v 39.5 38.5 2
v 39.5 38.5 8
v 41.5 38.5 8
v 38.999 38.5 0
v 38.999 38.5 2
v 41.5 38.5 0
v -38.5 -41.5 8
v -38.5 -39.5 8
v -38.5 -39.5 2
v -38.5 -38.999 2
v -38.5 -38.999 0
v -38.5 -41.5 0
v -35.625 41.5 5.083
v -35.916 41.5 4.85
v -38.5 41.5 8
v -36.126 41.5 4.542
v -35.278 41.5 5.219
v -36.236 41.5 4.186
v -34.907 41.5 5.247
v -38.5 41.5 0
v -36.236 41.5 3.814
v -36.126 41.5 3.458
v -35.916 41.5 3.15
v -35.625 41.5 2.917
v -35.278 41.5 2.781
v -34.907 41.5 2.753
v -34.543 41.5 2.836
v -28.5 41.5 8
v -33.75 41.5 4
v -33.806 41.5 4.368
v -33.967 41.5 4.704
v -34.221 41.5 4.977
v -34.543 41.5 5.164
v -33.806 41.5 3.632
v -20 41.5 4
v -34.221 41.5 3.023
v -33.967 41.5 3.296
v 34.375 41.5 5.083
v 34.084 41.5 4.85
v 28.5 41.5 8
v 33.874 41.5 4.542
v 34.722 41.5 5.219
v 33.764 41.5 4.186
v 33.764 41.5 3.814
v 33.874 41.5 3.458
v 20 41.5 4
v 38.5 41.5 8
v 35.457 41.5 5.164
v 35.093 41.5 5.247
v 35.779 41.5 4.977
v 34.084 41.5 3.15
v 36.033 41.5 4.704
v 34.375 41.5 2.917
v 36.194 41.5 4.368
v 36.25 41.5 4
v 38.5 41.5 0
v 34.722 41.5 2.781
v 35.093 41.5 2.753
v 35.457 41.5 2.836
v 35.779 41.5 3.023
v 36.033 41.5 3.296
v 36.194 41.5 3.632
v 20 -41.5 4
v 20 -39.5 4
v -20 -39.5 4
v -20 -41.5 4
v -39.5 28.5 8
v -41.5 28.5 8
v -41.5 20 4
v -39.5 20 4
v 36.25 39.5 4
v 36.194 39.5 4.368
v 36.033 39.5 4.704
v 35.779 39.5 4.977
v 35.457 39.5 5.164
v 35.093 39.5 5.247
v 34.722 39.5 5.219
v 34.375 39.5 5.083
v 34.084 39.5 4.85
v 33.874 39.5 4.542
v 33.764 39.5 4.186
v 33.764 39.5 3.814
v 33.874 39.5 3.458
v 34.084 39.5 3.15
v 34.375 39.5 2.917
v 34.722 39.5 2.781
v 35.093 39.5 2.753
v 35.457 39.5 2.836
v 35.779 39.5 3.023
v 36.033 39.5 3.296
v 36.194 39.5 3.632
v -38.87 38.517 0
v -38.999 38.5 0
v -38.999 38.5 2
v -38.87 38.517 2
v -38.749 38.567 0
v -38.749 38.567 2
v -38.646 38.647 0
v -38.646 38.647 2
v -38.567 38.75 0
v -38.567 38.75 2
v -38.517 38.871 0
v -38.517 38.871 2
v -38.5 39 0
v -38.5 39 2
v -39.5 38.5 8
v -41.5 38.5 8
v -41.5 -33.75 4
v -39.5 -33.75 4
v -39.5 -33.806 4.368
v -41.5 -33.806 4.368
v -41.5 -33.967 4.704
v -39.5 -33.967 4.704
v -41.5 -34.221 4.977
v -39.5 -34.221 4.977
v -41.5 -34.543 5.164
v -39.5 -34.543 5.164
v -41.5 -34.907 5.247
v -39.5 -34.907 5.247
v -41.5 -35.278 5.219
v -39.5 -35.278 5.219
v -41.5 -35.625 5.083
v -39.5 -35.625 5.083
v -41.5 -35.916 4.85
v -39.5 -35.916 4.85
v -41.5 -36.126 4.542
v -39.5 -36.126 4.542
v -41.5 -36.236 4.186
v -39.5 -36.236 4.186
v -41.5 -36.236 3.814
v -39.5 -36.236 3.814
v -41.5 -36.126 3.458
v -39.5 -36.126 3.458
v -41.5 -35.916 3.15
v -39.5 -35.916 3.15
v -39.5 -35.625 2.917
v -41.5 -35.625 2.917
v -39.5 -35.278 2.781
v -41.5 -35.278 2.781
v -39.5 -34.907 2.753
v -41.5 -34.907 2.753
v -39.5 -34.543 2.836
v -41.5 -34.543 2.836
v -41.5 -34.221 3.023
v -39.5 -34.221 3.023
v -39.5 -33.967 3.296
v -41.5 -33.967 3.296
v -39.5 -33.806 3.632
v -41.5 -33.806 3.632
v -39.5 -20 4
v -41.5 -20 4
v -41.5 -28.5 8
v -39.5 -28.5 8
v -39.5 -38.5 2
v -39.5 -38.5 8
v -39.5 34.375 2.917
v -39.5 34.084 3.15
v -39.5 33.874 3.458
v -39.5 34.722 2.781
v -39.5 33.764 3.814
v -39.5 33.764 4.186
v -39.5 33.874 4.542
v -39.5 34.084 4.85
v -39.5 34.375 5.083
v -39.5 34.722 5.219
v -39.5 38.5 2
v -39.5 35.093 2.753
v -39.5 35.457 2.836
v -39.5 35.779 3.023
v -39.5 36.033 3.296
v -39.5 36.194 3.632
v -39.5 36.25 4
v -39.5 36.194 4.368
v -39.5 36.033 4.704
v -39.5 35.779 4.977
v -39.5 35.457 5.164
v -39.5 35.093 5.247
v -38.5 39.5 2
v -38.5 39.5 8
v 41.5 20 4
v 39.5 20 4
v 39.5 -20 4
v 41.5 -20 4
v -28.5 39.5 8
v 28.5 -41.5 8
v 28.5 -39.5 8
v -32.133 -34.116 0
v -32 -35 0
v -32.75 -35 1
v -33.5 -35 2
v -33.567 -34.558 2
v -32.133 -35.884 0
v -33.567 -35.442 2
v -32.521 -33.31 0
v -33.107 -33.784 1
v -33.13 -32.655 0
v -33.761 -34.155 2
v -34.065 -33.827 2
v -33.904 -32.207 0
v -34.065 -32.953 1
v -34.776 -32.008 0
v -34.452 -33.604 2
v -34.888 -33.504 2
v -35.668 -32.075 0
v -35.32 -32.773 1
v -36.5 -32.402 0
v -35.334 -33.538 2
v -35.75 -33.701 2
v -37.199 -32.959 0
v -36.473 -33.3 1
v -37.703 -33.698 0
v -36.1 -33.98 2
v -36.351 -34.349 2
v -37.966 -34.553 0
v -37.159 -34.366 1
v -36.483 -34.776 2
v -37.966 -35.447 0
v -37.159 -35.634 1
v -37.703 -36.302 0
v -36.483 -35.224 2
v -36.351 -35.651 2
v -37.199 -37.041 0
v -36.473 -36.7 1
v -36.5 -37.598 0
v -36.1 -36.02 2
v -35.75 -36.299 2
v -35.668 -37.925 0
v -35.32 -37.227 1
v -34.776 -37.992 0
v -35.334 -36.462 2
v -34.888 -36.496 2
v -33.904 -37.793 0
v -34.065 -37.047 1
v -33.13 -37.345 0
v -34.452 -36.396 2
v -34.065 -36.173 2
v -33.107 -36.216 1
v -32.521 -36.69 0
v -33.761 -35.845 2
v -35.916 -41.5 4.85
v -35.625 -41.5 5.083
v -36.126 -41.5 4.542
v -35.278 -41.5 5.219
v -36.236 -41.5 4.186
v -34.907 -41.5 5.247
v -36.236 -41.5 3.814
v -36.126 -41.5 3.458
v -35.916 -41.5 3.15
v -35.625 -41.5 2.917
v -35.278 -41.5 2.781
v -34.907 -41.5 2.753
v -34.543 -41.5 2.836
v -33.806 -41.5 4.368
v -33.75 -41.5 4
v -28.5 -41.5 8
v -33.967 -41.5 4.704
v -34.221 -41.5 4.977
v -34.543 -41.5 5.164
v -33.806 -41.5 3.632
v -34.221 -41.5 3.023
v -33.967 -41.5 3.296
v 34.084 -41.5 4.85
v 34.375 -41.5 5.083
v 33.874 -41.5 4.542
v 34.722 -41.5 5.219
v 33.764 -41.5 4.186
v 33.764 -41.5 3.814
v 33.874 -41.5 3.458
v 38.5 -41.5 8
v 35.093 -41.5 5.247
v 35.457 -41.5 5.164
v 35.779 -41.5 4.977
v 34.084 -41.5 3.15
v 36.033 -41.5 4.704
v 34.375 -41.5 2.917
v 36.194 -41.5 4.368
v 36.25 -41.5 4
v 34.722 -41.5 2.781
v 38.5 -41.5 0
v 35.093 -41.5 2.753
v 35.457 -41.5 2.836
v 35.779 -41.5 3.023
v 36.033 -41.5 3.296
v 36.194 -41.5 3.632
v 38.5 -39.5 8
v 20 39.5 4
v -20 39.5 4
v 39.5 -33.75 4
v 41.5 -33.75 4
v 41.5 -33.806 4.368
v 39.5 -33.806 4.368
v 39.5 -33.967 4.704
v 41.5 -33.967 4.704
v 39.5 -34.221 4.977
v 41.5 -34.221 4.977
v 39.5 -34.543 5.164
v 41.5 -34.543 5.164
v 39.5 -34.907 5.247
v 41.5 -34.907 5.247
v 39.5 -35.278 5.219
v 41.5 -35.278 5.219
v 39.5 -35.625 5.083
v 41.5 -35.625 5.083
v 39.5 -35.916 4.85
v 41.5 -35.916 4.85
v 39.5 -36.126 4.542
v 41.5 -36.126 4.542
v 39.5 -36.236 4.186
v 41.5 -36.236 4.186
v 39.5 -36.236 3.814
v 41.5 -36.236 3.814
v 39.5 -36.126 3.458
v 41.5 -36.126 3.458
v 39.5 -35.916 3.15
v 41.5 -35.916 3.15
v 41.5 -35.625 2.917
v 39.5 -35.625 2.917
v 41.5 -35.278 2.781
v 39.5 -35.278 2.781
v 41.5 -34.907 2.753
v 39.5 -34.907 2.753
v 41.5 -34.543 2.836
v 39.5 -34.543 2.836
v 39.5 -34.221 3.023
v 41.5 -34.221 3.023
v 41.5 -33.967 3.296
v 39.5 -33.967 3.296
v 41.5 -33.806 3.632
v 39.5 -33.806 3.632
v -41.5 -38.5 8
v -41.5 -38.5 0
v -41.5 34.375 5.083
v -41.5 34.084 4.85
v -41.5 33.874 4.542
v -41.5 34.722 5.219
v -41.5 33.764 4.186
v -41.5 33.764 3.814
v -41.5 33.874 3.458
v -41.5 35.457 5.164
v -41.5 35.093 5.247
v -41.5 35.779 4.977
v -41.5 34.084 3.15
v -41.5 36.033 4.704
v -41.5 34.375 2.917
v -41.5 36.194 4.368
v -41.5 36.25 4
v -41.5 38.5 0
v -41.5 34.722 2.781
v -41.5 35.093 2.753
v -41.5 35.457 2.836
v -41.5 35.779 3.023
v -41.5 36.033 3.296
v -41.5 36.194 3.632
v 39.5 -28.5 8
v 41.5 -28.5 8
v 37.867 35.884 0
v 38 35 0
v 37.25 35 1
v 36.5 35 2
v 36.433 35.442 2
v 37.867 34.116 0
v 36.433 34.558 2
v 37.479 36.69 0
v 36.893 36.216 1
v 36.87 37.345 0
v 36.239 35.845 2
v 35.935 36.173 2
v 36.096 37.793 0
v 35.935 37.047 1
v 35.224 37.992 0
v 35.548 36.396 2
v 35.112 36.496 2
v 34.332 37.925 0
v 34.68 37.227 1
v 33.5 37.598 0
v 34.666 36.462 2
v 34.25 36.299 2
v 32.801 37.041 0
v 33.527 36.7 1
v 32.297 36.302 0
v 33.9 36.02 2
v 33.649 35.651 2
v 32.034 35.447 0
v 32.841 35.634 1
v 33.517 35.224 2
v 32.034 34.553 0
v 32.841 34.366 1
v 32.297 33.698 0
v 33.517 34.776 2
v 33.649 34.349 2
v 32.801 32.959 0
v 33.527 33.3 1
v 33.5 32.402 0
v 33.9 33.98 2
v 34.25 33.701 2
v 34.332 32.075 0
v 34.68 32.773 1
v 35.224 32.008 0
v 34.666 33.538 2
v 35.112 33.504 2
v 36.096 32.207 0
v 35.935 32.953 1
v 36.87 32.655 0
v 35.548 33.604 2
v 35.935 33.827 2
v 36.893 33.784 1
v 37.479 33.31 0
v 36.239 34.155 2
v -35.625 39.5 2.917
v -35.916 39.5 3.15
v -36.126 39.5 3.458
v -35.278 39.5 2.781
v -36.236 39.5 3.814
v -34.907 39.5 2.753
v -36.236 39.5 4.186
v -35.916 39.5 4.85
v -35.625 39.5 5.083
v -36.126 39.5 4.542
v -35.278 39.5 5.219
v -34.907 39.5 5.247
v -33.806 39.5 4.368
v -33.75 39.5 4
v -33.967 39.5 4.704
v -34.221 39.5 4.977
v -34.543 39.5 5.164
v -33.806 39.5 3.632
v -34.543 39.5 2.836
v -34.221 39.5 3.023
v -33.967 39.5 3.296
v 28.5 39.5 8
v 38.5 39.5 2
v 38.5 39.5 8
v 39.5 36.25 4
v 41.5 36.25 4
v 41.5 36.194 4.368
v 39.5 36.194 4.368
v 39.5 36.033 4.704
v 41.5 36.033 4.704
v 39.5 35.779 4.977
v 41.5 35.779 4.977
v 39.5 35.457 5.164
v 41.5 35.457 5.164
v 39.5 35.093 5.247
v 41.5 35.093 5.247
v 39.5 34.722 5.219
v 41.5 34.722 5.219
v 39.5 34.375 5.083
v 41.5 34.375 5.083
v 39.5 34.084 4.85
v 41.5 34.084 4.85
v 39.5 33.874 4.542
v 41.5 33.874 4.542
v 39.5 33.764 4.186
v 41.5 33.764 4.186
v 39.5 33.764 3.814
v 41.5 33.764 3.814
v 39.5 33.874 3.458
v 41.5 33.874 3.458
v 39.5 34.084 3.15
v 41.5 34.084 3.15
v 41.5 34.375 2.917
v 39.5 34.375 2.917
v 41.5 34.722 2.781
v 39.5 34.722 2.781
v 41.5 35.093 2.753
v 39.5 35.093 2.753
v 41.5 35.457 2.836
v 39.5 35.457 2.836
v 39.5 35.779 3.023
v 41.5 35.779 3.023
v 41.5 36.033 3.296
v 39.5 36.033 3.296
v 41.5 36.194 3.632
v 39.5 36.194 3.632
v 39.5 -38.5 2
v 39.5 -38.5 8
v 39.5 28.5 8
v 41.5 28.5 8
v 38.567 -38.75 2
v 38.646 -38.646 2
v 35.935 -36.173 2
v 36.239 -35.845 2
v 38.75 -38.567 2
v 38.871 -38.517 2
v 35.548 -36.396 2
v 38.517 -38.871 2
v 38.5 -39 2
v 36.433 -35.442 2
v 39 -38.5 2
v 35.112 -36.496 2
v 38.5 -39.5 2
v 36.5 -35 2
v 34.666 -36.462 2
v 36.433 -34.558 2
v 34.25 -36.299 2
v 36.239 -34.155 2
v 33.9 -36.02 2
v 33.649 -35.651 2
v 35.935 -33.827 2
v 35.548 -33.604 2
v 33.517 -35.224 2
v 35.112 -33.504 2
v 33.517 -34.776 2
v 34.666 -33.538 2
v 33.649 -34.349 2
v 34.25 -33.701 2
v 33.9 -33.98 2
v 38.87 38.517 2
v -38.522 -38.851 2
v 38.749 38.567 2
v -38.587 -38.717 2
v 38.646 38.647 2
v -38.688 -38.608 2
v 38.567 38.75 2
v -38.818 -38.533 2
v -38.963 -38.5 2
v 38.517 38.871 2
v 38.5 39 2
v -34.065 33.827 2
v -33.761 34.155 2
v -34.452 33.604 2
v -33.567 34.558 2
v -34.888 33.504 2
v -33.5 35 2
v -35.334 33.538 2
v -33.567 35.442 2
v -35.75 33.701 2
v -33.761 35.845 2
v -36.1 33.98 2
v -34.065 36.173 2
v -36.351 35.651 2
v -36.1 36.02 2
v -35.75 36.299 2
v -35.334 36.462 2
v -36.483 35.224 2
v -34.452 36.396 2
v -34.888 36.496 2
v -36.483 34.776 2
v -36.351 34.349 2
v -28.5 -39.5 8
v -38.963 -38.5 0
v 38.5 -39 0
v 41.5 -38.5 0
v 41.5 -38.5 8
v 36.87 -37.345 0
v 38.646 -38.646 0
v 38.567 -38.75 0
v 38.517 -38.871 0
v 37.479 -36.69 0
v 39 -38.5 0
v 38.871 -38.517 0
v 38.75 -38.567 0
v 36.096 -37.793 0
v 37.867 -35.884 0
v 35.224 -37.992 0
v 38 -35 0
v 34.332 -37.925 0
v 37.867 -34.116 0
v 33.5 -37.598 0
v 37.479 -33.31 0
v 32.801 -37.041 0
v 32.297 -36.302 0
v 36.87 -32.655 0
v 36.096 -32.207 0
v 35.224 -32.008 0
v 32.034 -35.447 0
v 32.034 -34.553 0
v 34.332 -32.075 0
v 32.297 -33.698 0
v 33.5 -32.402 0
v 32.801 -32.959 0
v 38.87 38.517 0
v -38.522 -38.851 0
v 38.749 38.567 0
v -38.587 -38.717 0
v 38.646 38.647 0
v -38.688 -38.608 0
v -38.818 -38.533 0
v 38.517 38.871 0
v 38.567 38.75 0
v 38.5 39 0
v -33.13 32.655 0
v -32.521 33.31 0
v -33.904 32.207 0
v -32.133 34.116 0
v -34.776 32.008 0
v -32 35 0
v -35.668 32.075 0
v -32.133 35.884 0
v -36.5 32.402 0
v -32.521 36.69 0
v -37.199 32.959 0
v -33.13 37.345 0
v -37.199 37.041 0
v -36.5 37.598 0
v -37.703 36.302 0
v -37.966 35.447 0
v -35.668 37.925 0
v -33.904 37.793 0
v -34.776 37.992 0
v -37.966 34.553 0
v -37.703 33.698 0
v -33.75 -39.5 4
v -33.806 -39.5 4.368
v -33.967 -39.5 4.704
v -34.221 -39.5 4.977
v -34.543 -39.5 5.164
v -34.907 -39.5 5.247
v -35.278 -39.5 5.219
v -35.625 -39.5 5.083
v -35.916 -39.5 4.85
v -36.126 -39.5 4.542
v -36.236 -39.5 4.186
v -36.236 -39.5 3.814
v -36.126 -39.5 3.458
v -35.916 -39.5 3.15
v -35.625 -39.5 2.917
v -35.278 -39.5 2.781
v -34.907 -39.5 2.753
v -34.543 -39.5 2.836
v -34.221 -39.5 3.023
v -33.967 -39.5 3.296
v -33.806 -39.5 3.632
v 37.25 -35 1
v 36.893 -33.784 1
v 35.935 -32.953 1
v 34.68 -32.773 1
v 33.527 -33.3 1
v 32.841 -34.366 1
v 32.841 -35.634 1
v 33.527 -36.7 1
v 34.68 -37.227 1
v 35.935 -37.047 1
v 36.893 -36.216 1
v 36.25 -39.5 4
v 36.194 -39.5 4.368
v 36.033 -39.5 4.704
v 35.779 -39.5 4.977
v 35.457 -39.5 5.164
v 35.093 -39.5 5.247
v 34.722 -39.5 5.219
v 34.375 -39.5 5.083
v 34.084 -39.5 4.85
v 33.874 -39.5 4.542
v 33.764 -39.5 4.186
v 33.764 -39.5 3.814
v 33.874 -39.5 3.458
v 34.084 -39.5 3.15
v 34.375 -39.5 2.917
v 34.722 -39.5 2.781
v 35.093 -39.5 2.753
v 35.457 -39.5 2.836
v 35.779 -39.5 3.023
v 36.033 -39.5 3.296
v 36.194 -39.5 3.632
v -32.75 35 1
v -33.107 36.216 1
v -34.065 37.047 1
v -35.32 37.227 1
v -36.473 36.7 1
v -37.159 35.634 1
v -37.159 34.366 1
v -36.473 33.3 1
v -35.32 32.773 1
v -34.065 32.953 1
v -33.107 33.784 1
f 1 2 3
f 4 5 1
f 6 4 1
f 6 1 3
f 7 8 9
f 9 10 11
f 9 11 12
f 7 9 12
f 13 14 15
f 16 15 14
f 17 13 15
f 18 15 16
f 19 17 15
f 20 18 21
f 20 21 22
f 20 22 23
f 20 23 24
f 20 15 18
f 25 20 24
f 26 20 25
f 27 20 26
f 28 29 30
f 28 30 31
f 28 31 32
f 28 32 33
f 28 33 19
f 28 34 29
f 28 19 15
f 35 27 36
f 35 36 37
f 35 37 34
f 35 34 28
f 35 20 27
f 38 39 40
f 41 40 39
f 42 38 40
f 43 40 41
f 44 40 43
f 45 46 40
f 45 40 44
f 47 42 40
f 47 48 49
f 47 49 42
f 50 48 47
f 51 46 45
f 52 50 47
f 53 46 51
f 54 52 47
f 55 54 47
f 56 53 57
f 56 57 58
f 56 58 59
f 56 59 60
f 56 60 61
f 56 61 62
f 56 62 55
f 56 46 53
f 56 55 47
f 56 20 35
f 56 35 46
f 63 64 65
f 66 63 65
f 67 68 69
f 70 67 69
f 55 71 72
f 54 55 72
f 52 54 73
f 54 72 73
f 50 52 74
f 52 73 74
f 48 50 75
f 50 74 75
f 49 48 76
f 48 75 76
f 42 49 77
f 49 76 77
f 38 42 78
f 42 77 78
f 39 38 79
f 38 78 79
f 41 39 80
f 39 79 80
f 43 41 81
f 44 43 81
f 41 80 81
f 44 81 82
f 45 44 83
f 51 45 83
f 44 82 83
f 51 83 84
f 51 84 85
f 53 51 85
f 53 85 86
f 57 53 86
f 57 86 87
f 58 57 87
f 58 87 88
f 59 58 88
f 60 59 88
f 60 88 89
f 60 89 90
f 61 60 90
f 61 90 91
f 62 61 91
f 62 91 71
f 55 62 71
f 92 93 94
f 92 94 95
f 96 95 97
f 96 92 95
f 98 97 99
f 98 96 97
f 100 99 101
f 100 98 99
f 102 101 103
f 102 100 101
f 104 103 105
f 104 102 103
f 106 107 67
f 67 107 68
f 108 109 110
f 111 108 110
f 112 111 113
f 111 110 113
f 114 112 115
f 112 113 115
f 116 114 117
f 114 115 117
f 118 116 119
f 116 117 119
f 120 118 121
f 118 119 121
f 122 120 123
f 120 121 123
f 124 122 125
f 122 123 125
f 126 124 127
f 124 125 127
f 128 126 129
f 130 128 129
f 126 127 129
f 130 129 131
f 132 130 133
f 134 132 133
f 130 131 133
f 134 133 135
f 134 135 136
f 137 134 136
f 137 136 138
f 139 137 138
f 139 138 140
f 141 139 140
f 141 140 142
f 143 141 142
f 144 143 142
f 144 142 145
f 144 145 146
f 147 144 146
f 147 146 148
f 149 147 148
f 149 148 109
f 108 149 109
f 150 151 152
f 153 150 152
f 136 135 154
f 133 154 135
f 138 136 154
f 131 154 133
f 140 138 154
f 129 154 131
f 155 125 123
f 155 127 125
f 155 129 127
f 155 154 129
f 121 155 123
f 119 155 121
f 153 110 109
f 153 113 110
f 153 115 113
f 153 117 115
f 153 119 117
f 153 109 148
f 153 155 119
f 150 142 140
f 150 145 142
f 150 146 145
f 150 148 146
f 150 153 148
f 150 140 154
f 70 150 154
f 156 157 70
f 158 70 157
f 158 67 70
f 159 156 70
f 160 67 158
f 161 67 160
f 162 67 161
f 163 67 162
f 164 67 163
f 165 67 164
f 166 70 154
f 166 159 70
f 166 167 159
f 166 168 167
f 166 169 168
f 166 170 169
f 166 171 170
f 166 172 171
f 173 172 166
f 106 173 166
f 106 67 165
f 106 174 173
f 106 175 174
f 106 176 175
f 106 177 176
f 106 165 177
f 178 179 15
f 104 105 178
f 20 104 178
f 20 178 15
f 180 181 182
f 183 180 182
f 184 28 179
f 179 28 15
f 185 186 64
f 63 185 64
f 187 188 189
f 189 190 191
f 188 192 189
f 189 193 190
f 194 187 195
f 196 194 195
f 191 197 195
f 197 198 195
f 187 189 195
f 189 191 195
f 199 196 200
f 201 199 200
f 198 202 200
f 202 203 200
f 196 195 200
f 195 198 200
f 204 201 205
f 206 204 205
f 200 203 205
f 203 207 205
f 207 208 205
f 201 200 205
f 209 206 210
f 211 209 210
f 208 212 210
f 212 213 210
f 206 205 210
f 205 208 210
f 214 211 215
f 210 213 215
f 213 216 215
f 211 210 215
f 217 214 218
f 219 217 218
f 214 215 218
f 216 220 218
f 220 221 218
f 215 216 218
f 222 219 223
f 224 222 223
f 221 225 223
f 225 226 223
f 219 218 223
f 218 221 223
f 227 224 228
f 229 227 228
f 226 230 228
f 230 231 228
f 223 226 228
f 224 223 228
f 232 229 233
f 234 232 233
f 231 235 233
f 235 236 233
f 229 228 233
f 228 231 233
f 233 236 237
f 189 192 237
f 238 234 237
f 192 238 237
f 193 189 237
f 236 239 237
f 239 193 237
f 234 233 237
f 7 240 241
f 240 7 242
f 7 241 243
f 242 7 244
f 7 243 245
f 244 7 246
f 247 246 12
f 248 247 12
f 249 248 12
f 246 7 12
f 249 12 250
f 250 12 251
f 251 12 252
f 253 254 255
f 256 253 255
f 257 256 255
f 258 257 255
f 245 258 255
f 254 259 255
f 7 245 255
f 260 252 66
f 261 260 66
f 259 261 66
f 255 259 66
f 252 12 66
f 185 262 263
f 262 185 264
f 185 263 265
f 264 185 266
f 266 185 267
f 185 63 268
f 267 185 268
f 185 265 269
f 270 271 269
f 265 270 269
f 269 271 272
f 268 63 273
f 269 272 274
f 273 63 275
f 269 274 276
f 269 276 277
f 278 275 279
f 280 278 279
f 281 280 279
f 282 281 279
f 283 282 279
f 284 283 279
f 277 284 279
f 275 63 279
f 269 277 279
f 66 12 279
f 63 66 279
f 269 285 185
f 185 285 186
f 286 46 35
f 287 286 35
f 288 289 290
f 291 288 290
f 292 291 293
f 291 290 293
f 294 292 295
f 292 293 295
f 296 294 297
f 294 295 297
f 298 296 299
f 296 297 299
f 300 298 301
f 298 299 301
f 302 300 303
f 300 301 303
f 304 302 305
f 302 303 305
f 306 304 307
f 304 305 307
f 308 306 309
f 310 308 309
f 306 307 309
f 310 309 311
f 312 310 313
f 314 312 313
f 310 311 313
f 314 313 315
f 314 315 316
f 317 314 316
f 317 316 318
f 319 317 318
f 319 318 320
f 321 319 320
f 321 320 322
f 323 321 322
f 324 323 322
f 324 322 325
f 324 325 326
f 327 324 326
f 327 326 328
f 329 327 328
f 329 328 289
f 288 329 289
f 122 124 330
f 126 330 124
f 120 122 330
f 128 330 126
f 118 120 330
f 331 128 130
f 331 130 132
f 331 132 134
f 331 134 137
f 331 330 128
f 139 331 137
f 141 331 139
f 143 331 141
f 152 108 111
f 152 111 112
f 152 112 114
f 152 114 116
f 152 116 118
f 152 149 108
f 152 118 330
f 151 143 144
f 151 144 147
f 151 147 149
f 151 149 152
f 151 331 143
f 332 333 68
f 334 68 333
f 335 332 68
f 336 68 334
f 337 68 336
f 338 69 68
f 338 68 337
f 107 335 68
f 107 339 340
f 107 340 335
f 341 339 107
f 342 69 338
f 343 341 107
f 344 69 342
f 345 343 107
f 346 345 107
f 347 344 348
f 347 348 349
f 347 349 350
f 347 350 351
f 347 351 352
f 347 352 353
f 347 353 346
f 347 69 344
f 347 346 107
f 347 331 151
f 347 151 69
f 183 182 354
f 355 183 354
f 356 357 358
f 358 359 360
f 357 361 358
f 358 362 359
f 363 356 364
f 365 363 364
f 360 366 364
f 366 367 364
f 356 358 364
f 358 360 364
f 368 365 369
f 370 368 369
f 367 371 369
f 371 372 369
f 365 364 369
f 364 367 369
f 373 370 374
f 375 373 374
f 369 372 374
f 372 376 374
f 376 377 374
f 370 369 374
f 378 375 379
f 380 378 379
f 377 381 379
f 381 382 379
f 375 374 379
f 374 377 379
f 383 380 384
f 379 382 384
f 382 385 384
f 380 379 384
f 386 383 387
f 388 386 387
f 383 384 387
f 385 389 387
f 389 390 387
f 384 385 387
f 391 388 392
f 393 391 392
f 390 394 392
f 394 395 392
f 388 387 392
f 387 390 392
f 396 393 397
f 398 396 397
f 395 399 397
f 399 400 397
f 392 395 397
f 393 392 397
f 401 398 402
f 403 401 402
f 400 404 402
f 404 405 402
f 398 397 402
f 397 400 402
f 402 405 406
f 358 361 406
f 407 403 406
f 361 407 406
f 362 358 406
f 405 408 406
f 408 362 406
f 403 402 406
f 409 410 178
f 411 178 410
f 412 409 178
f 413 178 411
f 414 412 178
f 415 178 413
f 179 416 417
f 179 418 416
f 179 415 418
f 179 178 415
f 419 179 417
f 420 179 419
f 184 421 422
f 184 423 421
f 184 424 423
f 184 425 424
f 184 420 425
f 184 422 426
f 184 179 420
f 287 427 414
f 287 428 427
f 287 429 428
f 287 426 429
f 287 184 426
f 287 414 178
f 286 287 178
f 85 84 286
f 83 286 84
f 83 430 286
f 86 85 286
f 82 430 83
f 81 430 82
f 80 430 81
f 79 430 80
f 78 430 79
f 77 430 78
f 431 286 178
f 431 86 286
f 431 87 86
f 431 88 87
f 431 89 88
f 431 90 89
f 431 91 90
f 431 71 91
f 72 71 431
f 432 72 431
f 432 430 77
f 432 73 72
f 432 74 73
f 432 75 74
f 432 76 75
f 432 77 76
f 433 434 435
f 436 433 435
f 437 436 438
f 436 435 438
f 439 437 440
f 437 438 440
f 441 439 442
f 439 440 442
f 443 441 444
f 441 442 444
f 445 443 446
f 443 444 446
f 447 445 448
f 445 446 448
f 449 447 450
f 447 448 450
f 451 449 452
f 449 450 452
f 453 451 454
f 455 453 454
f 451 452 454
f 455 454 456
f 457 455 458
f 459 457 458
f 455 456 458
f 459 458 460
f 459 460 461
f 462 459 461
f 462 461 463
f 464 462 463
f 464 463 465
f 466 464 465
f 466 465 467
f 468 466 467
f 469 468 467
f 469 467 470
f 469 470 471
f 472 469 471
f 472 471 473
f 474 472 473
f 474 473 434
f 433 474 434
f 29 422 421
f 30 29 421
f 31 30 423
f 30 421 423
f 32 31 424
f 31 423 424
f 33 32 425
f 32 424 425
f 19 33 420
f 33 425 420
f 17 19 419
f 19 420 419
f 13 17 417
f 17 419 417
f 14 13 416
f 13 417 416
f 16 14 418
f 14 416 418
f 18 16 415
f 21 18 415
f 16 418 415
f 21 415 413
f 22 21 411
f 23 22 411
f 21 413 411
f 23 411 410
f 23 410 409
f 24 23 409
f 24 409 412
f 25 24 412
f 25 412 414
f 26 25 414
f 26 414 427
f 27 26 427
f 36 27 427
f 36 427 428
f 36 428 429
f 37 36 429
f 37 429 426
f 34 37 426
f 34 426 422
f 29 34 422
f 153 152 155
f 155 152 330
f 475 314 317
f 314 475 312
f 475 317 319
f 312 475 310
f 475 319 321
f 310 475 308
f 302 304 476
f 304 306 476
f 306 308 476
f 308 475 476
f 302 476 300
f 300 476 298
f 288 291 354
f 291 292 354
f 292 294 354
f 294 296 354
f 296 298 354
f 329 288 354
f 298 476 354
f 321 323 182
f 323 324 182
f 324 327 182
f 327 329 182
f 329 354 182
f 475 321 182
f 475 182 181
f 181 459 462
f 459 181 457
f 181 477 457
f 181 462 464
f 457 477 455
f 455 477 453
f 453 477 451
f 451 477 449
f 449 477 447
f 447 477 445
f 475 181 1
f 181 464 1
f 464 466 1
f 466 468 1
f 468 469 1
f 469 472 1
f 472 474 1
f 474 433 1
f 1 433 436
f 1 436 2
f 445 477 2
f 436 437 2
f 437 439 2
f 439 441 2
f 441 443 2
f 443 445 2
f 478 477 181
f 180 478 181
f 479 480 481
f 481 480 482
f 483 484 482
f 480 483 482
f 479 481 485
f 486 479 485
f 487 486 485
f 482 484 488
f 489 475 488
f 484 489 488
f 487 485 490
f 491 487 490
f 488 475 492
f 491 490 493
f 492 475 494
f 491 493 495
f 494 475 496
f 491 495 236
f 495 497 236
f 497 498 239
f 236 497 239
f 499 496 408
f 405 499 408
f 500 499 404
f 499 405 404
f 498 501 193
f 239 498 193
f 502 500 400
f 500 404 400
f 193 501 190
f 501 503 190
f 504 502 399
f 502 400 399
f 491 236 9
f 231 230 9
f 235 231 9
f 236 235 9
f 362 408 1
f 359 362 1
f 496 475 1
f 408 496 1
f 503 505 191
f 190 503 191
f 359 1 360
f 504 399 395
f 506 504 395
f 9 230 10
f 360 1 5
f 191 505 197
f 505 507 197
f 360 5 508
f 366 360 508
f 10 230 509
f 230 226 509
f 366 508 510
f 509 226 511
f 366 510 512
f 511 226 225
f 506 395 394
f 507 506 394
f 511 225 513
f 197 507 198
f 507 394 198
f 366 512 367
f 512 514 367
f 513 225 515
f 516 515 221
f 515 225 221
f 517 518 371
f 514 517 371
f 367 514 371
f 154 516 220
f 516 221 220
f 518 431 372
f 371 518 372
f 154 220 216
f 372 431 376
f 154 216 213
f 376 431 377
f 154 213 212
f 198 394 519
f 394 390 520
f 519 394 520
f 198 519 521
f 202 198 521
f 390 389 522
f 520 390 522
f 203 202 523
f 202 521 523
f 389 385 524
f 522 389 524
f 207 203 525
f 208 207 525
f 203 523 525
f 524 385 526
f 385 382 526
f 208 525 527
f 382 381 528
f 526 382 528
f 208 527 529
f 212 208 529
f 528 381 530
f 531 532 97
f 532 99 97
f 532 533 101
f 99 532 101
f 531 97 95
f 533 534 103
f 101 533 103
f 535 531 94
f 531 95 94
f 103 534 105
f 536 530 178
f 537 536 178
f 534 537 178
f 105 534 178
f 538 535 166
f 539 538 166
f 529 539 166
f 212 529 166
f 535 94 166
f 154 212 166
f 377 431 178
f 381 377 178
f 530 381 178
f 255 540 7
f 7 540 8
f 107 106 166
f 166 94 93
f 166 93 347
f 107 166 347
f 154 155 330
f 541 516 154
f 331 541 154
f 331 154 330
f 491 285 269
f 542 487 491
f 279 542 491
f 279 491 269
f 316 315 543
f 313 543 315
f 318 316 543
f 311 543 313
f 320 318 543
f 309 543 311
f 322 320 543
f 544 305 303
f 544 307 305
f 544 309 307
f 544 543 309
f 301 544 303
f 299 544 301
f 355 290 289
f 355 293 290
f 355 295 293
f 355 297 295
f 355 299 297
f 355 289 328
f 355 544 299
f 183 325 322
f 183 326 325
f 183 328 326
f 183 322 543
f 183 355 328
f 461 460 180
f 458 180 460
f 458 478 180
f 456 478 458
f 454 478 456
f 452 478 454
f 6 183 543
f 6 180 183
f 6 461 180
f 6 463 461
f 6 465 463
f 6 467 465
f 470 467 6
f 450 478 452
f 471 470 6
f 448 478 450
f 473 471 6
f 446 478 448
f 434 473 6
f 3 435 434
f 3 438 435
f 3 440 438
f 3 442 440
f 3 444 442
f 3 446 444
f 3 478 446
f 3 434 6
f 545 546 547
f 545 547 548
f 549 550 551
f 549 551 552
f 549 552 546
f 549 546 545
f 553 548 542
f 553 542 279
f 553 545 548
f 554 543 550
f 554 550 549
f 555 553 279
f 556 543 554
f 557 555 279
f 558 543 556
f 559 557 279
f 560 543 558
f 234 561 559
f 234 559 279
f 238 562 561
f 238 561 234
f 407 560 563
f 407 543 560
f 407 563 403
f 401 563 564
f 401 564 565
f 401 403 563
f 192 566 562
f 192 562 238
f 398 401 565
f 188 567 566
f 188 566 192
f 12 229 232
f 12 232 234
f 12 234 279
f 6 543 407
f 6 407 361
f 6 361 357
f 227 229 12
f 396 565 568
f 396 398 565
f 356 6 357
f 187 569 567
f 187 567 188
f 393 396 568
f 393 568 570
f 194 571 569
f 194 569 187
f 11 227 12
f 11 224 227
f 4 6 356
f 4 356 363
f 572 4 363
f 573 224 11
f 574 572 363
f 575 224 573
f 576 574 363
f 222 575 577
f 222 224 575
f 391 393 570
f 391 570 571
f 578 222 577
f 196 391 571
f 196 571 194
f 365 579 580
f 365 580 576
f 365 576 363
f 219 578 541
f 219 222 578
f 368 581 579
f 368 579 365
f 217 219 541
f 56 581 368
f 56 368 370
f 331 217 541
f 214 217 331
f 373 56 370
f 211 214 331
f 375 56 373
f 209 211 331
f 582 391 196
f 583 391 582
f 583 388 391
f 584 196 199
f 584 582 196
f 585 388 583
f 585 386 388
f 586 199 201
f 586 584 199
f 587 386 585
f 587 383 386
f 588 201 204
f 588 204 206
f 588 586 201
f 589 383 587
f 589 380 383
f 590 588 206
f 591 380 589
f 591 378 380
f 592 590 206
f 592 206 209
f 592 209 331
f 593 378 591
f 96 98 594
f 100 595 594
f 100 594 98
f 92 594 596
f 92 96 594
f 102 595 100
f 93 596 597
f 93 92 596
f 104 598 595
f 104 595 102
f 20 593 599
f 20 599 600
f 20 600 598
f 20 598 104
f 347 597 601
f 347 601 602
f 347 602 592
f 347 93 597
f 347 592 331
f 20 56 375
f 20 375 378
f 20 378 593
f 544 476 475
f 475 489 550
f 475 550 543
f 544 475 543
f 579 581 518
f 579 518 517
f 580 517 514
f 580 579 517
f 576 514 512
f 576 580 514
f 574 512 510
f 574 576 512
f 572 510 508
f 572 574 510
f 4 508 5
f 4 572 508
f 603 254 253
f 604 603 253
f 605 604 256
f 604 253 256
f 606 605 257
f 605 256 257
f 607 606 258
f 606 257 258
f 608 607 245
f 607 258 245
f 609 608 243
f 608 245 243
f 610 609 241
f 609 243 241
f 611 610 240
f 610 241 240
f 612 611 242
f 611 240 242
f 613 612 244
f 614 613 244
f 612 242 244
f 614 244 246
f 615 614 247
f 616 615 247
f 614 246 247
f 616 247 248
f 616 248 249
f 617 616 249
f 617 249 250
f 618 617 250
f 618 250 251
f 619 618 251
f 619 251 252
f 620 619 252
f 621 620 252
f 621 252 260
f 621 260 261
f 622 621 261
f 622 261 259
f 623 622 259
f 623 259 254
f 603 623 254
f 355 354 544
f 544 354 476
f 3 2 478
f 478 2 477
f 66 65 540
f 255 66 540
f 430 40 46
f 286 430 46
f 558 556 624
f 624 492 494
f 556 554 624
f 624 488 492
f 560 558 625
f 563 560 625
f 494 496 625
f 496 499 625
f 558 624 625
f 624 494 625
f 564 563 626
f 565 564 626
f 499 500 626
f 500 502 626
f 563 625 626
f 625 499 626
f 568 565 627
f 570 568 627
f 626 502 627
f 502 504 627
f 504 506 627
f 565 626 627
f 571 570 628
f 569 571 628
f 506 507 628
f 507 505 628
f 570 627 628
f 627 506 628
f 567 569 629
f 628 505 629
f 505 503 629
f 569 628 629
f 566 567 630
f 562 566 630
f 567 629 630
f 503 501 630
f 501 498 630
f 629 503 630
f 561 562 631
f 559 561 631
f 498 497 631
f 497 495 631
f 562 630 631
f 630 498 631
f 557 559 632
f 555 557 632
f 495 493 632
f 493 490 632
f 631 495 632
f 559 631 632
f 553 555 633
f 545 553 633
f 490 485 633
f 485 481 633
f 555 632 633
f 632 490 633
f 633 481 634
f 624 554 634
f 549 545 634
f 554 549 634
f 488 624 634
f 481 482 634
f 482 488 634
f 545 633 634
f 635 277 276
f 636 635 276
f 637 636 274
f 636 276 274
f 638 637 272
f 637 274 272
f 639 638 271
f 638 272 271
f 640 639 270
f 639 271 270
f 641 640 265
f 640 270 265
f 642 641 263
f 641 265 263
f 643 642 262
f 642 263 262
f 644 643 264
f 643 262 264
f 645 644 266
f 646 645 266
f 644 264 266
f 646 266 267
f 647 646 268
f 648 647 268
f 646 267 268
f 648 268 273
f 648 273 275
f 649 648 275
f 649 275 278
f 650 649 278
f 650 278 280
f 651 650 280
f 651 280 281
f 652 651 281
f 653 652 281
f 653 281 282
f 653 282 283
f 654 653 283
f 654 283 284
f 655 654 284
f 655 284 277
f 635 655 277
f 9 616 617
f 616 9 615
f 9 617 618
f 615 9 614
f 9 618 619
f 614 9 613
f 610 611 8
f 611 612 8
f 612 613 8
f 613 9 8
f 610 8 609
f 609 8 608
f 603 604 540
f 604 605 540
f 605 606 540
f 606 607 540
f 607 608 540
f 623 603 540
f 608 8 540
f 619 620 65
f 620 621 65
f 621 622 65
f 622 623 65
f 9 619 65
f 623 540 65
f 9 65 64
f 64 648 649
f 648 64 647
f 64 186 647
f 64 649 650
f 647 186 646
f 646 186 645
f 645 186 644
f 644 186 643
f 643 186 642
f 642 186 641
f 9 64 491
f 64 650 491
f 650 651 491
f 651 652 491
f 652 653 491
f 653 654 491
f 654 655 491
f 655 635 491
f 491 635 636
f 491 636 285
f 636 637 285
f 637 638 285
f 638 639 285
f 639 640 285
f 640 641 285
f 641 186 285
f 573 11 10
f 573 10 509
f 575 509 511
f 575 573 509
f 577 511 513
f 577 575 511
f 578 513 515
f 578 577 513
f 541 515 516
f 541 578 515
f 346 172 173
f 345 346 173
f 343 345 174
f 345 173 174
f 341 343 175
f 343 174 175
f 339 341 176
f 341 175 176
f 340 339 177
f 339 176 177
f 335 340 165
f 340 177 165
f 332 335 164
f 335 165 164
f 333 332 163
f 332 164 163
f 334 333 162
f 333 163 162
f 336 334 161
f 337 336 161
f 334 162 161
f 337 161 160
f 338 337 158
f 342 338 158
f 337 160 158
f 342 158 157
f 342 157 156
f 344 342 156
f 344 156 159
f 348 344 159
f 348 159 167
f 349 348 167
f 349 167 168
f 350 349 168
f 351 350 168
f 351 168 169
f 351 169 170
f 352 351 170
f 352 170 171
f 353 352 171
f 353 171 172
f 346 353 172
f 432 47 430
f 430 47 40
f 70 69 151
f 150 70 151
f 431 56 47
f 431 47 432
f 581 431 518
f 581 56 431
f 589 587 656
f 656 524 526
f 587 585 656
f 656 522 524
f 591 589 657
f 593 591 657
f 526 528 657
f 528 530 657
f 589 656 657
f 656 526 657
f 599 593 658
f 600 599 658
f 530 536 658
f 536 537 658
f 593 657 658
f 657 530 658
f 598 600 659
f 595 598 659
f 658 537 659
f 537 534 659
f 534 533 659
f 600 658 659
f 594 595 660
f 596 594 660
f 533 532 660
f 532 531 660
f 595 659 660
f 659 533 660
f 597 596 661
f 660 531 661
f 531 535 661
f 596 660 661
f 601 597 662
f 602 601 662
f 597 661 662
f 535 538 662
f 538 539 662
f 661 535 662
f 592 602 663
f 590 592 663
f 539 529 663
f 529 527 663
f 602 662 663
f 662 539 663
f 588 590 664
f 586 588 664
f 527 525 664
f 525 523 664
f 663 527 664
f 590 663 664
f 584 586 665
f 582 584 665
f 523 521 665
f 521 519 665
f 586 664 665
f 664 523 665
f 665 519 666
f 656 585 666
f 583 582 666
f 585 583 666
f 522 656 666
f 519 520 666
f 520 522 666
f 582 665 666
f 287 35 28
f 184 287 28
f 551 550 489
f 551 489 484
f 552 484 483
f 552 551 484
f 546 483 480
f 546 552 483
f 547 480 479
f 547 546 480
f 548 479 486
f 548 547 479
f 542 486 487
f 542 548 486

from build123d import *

# Parameters (mm, degrees)
PAD004_DEPTH    = 2
SKETCH016_R     = 1.25
POCKET003_DEPTH = 2.001
PAD002_DEPTH    = 2
SKETCH015_R     = 1.25
POCKET002_DEPTH = 2.001
PAD001_DEPTH    = 2
SKETCH017_R     = 1.25
POCKET_DEPTH    = 2.001
SKETCH007_R     = 3
SKETCH008_R     = 1.5
SKETCH005_R     = 3
SKETCH006_R     = 1.5
SKETCH003_R     = 3
SKETCH004_R     = 1.5
SKETCH001_R     = 3
SKETCH002_R     = 1.5
PAD_DEPTH       = 2
PAD003_DEPTH    = 2
SKETCH014_R     = 1.25
POCKET001_DEPTH = 2.001


with BuildPart() as pocket003:
    # Sketch010 → Pad004 (new body)
    with BuildSketch(Plane.XZ.offset(-41.5)):
        Polygon((-38.5, 0), (38.5, 0), (38.5, 8), (28.5, 8), (20, 4), (-20, 4), (-28.5, 8), (-38.5, 8), align=None)
    extrude(amount=PAD004_DEPTH)

    # Sketch016 → Pocket003 (cut, through all)
    with BuildSketch(Plane.XZ.offset(-39.5)):
        with Locations((-35, 4)):
            Circle(SKETCH016_R)
        with Locations((35, 4)):
            Circle(SKETCH016_R)
    extrude(amount=-POCKET003_DEPTH, mode=Mode.SUBTRACT)


with BuildPart() as pocket002:
    # Sketch012 → Pad002 (new body)
    with BuildSketch(Plane.YZ.offset(-41.5)):
        Polygon((-38.5, 0), (38.5, 0), (38.5, 8), (28.5, 8), (20, 4), (-20, 4), (-28.5, 8), (-38.5, 8), align=None)
    extrude(amount=PAD002_DEPTH)

    # Sketch015 → Pocket002 (cut, through all)
    with BuildSketch(Plane.YZ.offset(-39.5)):
        with Locations((-35, 4)):
            Circle(SKETCH015_R)
        with Locations((35, 4)):
            Circle(SKETCH015_R)
    extrude(amount=-POCKET002_DEPTH, mode=Mode.SUBTRACT)


with BuildPart() as pocket:
    # Sketch009 → Pad001 (new body)
    with BuildSketch(Plane.XZ.offset(39.5)):
        Polygon((-38.5, 0), (38.5, 0), (38.5, 8), (28.5, 8), (20, 4), (-20, 4), (-28.5, 7.999908), (-38.5, 7.999908), (-38.5, 8), align=None)
    extrude(amount=PAD001_DEPTH)

    # Sketch017 → Pocket (cut, through all)
    with BuildSketch(Plane.XZ.offset(41.5)):
        with Locations((-35, 4)):
            Circle(SKETCH017_R)
        with Locations((35, 4)):
            Circle(SKETCH017_R)
    extrude(amount=-POCKET_DEPTH, mode=Mode.SUBTRACT)


with BuildPart() as loft003:
    # Sketch007 → Loft003 section 0
    with BuildSketch(Plane.XY):
        with Locations((35, 35)):
            Circle(SKETCH007_R)
    # Sketch008 → Loft003 section 1
    with BuildSketch(Plane.XY.offset(2)):
        with Locations((35, 35)):
            Circle(SKETCH008_R)
    loft(ruled=True)


with BuildPart() as loft002:
    # Sketch005 → Loft002 section 0
    with BuildSketch(Plane.XY):
        with Locations((-35, 35)):
            Circle(SKETCH005_R)
    # Sketch006 → Loft002 section 1
    with BuildSketch(Plane.XY.offset(2)):
        with Locations((-35, 35)):
            Circle(SKETCH006_R)
    loft(ruled=True)


with BuildPart() as loft001:
    # Sketch003 → Loft001 section 0
    with BuildSketch(Plane.XY):
        with Locations((35, -35)):
            Circle(SKETCH003_R)
    # Sketch004 → Loft001 section 1
    with BuildSketch(Plane.XY.offset(2)):
        with Locations((35, -35)):
            Circle(SKETCH004_R)
    loft(ruled=True)


with BuildPart() as loft_body:
    # Sketch001 → Loft section 0
    with BuildSketch(Plane.XY):
        with Locations((-35, -35)):
            Circle(SKETCH001_R)
    # Sketch002 → Loft section 1
    with BuildSketch(Plane.XY.offset(2)):
        with Locations((-35, -35)):
            Circle(SKETCH002_R)
    loft(ruled=True)


with BuildPart() as fusion002:
    # Sketch → Pad (new body)
    with BuildSketch(Plane.XY):
        with BuildLine():
            Line((-41.5, -38.5), (-41.5, 38.5))
            Line((-38.99866, 38.5), (-41.5, 38.5))
            ThreePointArc((-38.99866, 38.5), (-38.645973, 38.646919), (-38.5, 38.999998))
            Line((-38.5, 38.999998), (-38.5, 41.5))
            Line((-38.5, 41.5), (38.5, 41.5))
            Line((38.5, 41.5), (38.5, 38.999998))
            ThreePointArc((38.5, 38.999998), (38.645973, 38.646919), (38.99866, 38.5))
            Line((38.99866, 38.5), (41.5, 38.5))
            Line((41.5, 38.5), (41.5, -38.5))
            Line((39, -38.5), (41.5, -38.5))
            ThreePointArc((39, -38.5), (38.646447, -38.646447), (38.5, -39))
            Line((38.5, -39), (38.5, -41.5))
            Line((-38.5, -41.5), (38.5, -41.5))
            Line((-38.5, -38.998755), (-38.5, -41.5))
            ThreePointArc((-38.5, -38.998755), (-38.633612, -38.658406), (-38.963153, -38.5))
            Line((-38.963153, -38.5), (-41.5, -38.5))
        make_face()
    extrude(amount=PAD_DEPTH)

    # Cut: cut Loft body
    add(loft_body.part, mode=Mode.SUBTRACT)

    # Cut001: cut Loft001
    add(loft001.part, mode=Mode.SUBTRACT)

    # Cut002: cut Loft002
    add(loft002.part, mode=Mode.SUBTRACT)

    # Cut003: cut Loft003
    add(loft003.part, mode=Mode.SUBTRACT)

    # Fusion: union Pocket
    add(pocket.part)

    # Fusion001: union Pocket002
    add(pocket002.part)

    # Fusion002: union Pocket003
    add(pocket003.part)


with BuildPart() as fusion003:
    # Sketch011 → Pad003 (new body)
    with BuildSketch(Plane.YZ.offset(39.5)):
        Polygon((-38.5, 0), (38.5, 0), (38.5, 8), (28.5, 8), (20, 4), (-20, 4), (-28.5, 8), (-38.5, 8), align=None)
    extrude(amount=PAD003_DEPTH)

    # Sketch014 → Pocket001 (cut, through all)
    with BuildSketch(Plane.YZ.offset(41.5)):
        with Locations((-35, 4)):
            Circle(SKETCH014_R)
        with Locations((35, 4)):
            Circle(SKETCH014_R)
    extrude(amount=-POCKET001_DEPTH, mode=Mode.SUBTRACT)

    # Fusion003: union Fusion002
    add(fusion002.part)


solid = fusion003.part
